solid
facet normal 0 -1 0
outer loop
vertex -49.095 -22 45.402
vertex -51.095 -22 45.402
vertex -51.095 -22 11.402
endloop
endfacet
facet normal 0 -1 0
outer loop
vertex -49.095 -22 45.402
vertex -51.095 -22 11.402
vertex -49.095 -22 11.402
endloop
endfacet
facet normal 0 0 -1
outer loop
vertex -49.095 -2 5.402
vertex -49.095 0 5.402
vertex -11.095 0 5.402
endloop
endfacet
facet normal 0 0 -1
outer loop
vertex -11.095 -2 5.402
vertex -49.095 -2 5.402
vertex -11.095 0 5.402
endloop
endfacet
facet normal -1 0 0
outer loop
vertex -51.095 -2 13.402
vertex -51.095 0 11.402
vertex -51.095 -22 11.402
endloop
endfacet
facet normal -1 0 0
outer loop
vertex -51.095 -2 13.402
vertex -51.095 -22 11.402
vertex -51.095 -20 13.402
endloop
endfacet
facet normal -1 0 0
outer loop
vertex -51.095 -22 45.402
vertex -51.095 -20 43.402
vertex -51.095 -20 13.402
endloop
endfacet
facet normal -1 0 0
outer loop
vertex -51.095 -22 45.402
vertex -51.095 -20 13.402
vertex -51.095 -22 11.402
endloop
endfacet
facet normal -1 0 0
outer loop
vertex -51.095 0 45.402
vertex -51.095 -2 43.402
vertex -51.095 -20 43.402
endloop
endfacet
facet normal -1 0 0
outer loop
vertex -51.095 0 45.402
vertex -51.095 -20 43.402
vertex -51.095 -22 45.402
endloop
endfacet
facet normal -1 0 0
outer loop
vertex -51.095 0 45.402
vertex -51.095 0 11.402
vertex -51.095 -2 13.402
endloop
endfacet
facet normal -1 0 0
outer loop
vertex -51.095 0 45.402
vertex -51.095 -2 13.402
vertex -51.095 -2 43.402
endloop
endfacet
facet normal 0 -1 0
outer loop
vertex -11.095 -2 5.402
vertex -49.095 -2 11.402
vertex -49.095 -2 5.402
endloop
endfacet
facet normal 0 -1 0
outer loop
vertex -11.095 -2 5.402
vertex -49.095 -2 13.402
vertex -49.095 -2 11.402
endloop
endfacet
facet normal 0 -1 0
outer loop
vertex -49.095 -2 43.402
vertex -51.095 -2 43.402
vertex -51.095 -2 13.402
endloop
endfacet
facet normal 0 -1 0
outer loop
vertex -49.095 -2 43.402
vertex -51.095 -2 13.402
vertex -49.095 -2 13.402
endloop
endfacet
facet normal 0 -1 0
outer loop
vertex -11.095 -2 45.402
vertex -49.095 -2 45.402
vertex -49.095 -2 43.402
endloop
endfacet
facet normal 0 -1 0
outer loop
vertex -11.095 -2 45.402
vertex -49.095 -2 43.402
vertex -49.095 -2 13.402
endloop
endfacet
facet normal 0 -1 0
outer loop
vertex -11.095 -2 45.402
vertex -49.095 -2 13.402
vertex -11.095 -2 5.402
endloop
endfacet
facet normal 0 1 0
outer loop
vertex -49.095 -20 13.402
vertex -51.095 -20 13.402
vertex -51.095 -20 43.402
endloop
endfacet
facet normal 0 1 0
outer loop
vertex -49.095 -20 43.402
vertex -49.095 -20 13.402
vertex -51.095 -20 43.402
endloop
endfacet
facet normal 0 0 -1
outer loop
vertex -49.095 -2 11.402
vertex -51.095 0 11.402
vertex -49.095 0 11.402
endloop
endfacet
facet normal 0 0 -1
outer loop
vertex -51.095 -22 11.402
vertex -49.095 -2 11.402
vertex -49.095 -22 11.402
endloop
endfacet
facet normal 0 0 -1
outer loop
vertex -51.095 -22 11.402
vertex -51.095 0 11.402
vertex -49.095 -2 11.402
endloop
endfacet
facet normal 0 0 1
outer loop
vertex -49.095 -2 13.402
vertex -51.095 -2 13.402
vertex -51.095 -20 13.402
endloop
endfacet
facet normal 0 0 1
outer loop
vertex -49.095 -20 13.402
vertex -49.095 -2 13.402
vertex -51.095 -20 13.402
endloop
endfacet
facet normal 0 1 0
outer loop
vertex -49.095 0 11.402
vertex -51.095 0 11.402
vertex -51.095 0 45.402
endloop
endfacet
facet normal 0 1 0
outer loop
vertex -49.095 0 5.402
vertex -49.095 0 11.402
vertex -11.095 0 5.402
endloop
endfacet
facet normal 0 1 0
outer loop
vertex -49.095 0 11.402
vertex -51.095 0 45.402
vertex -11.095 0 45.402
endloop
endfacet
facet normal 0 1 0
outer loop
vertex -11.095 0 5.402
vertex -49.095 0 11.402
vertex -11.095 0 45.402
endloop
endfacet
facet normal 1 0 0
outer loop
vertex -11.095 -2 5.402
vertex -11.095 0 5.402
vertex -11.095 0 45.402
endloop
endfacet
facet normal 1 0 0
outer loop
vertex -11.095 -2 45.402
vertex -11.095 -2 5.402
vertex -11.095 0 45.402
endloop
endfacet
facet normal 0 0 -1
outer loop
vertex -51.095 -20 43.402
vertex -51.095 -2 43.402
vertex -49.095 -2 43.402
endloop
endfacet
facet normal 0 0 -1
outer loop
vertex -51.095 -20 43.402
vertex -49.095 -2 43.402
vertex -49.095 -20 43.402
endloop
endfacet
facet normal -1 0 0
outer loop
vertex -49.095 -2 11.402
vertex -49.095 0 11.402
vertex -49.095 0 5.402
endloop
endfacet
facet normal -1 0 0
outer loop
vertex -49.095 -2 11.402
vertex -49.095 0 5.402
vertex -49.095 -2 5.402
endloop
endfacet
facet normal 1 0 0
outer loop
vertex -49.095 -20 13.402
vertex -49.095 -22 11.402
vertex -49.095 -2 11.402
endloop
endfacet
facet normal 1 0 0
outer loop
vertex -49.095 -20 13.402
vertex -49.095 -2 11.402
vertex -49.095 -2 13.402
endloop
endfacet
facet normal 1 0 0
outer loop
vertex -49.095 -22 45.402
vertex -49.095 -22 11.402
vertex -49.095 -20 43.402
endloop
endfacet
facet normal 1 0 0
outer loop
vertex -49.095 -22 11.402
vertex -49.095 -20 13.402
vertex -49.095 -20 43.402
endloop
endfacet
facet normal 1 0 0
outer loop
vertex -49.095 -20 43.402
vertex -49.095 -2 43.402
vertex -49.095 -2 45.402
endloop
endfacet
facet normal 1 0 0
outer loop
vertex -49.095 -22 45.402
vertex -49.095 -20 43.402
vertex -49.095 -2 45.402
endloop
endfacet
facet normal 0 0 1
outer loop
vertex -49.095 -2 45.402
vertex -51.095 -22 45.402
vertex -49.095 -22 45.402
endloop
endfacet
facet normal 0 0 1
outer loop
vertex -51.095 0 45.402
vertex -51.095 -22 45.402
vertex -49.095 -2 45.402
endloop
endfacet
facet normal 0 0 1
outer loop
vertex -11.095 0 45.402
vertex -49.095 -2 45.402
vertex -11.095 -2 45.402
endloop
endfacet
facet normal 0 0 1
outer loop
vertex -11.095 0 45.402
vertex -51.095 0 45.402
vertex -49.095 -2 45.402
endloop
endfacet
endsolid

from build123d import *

# Parameters (mm, degrees)
F0_W     = 40
F0_H     = 40
F1_DEPTH = 2
F2_W     = 2
F2_H     = 34
F3_DEPTH = 20
F4_W     = 18
F4_H     = 30
F5_DEPTH = 40.001
F6_W     = 2
F6_H     = 6
F7_DEPTH = 2


# Not quite as in the source:
# - the program builds the solid bodies; features that only make, move or delete a surface that nothing else refers to are left out


with BuildPart() as f1:
    # F0 (on Front) → F1 (new body)
    with BuildSketch(Plane.XZ):
        with Locations((-31.0945767164, 25.4016729393)):
            Rectangle(F0_W, F0_H)
    extrude(amount=F1_DEPTH)

    # F2 (on face) → F3 (join)
    with BuildSketch(Plane.XZ.offset(2)):
        with Locations((-50.0945767164, 28.4016729393)):
            Rectangle(F2_W, F2_H)
    extrude(amount=F3_DEPTH)

    # F4 (on face) → F5 (cut, through all)
    with BuildSketch(Plane(origin=(-51.0945767164, 0, 0), x_dir=(0, -1, 0), z_dir=(-1, 0, 0))):
        with Locations((11, 28.4016729393)):
            Rectangle(F4_W, F4_H)
    extrude(amount=-F5_DEPTH, mode=Mode.SUBTRACT)

    # F6 (on face) → F7 (cut)
    with BuildSketch(Plane(origin=(-51.0945767164, 0, 0), x_dir=(0, -1, 0), z_dir=(-1, 0, 0))):
        with Locations((1, 8.4016729393)):
            Rectangle(F6_W, F6_H)
    extrude(amount=-F7_DEPTH, mode=Mode.SUBTRACT)


solid = f1.part
